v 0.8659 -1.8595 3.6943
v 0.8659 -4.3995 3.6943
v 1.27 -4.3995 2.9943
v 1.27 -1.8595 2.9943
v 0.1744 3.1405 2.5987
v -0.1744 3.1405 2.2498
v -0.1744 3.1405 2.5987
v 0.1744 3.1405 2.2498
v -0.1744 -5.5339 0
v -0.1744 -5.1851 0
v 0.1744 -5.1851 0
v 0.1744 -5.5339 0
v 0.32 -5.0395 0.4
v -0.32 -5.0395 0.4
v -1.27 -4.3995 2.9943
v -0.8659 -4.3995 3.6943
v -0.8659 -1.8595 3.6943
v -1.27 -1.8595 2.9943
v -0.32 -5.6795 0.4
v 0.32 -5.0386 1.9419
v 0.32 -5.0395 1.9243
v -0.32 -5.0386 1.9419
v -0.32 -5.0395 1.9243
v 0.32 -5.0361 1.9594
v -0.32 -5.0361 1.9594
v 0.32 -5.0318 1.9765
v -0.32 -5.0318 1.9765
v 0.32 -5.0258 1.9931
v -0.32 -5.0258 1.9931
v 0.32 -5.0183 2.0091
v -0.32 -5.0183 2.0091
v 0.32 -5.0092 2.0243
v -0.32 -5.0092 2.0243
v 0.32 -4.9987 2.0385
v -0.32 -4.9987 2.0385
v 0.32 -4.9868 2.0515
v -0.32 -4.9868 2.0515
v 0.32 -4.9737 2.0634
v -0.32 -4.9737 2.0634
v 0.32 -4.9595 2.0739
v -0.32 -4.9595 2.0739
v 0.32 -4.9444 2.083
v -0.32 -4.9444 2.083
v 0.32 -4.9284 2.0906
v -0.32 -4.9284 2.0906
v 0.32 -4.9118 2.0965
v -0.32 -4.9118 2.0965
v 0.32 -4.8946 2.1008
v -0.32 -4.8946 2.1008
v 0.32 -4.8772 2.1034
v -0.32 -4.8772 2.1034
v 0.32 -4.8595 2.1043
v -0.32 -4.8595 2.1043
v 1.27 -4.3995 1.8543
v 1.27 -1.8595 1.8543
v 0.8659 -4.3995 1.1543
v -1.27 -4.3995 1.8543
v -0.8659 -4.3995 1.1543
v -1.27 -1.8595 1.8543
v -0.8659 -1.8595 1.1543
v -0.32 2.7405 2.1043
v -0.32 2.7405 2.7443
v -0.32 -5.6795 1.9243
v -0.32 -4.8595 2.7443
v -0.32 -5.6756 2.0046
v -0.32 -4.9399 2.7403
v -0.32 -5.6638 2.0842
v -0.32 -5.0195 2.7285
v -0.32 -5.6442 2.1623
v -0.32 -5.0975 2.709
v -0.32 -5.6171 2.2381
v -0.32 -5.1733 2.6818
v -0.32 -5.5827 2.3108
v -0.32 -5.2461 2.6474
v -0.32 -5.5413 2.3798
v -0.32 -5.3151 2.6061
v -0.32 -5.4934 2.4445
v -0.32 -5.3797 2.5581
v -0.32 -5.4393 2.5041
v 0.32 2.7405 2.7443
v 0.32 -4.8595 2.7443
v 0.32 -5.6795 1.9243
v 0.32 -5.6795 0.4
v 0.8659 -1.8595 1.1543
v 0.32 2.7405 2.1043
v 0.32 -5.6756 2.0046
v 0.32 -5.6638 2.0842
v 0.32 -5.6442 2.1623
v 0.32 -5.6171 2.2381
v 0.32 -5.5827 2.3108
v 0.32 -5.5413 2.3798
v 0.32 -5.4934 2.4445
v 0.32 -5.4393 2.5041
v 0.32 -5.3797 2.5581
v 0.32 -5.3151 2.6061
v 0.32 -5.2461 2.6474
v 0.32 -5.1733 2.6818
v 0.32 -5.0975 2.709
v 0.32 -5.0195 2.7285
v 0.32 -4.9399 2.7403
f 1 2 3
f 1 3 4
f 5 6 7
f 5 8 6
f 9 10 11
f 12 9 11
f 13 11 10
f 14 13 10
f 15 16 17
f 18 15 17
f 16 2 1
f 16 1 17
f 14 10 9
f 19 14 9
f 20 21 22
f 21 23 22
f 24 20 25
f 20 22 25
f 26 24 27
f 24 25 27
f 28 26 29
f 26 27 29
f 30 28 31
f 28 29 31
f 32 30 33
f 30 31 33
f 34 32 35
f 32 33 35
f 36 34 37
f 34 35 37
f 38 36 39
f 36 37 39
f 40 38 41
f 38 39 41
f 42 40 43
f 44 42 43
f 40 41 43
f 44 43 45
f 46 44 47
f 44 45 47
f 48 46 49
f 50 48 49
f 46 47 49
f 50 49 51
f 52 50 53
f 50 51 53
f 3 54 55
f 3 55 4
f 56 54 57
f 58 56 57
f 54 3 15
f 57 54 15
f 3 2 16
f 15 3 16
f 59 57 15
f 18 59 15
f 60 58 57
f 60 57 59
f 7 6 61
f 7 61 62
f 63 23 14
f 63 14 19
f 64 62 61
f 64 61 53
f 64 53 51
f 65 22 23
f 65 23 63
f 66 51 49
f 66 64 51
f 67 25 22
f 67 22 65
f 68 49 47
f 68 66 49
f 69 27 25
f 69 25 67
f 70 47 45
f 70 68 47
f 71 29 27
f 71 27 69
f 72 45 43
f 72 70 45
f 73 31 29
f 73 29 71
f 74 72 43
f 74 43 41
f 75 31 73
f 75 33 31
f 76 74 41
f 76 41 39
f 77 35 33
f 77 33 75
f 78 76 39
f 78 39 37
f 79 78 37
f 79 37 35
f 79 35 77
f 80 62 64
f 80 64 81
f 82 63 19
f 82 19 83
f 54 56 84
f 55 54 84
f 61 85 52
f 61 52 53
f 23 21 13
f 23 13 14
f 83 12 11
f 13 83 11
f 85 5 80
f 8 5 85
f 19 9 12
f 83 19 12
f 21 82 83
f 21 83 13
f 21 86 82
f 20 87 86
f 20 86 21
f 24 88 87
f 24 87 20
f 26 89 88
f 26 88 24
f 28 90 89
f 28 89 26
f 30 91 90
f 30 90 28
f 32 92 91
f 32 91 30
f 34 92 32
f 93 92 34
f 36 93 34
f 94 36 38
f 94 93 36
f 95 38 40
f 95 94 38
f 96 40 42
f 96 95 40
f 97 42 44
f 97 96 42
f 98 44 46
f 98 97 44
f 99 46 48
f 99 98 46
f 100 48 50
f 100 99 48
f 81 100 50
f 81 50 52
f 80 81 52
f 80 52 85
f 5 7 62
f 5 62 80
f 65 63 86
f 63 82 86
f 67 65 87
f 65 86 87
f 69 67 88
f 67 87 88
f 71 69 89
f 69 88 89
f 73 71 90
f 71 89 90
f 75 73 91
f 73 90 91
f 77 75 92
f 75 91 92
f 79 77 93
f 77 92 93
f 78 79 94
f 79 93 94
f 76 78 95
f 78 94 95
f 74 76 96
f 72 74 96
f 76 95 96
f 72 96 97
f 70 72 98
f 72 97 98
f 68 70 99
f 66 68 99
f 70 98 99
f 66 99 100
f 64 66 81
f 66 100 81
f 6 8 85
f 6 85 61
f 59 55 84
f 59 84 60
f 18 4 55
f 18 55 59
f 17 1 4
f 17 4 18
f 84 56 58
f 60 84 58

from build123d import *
from OCP.BRepFilletAPI import BRepFilletAPI_MakeChamfer

# Parameters (mm, degrees)
SKETCH2_W      = 0.64
SKETCH2_H      = 0.64
CHAMFER1_SIZE  = 0.4
CHAMFER1_SIZE2 = 0.145588094
SKETCH6_W      = 2.54
SKETCH6_H      = 2.54
EXTRUDE1_DEPTH = 2.54
CHAMFER2_SIZE  = 0.7
CHAMFER2_SIZE2 = 0.404145188


with BuildPart() as part:
    # Sweep1: sweep along a path in Sketch1
    with BuildLine(Plane(origin=(0, 0, 0), x_dir=(0, 0, -1), z_dir=(1, 0, 0))) as sweep1_path:
        Line((0, -5.359515774), (-1.924260195, -5.359515774))
        ThreePointArc((-1.924260195, -5.359515774), (-2.277813586, -5.213069164), (-2.424260195, -4.859515774))
        Line((-2.424260195, -4.859515774), (-2.424260195, 3.140484226))
    # Sketch2 → Sweep1 (sweep)
    with BuildSketch(Plane.XY):
        with Locations((0, -5.359515774)):
            Rectangle(SKETCH2_W, SKETCH2_H)
    sweep(path=sweep1_path.line)

    # Chamfer1: one chamfer whose edges measure the first distance from different faces: ONE call of the kernel's chamfer builder (chamfer() names one face for all edges)
    chamfer1_edges_1 = [part.edges().sort_by_distance(p)[0] for p in [
        (-0.32, 3.140484226, 2.424260195),
        (-0.32, -5.359515774, 0),
    ]]
    chamfer1_side_1 = [part.faces().sort_by_distance(p)[0] for p in [
        (-0.32, -1.987926827, 2.15141447),
    ]]
    chamfer1_edges_2 = [part.edges().sort_by_distance(p)[0] for p in [
        (0, 3.140484226, 2.104260195),
    ]]
    chamfer1_side_2 = [part.faces().sort_by_distance(p)[0] for p in [
        (0, -0.859515774, 2.104260195),
    ]]
    chamfer1_edges_3 = [part.edges().sort_by_distance(p)[0] for p in [
        (0.32, 3.140484226, 2.424260195),
        (0.32, -5.359515774, 0),
    ]]
    chamfer1_side_3 = [part.faces().sort_by_distance(p)[0] for p in [
        (0.32, -1.987926827, 2.15141447),
    ]]
    chamfer1_edges_4 = [part.edges().sort_by_distance(p)[0] for p in [
        (0, 3.140484226, 2.744260195),
    ]]
    chamfer1_side_4 = [part.faces().sort_by_distance(p)[0] for p in [
        (0, -0.859515774, 2.744260195),
    ]]
    chamfer1_edges_5 = [part.edges().sort_by_distance(p)[0] for p in [
        (0, -5.039515774, 0),
    ]]
    chamfer1_side_5 = [part.faces().sort_by_distance(p)[0] for p in [
        (0, -5.039515774, 0.962130097),
    ]]
    chamfer1_edges_6 = [part.edges().sort_by_distance(p)[0] for p in [
        (0, -5.679515774, 0),
    ]]
    chamfer1_side_6 = [part.faces().sort_by_distance(p)[0] for p in [
        (0, -5.679515774, 0.962130097),
    ]]
    chamfer1 = BRepFilletAPI_MakeChamfer(part.part.solid().wrapped)
    for e in chamfer1_edges_1:
        chamfer1.Add(CHAMFER1_SIZE, CHAMFER1_SIZE2, e.wrapped, chamfer1_side_1[0].wrapped)  # the first distance lies on this face
    for e in chamfer1_edges_2:
        chamfer1.Add(CHAMFER1_SIZE, CHAMFER1_SIZE2, e.wrapped, chamfer1_side_2[0].wrapped)  # the first distance lies on this face
    for e in chamfer1_edges_3:
        chamfer1.Add(CHAMFER1_SIZE, CHAMFER1_SIZE2, e.wrapped, chamfer1_side_3[0].wrapped)  # the first distance lies on this face
    for e in chamfer1_edges_4:
        chamfer1.Add(CHAMFER1_SIZE, CHAMFER1_SIZE2, e.wrapped, chamfer1_side_4[0].wrapped)  # the first distance lies on this face
    for e in chamfer1_edges_5:
        chamfer1.Add(CHAMFER1_SIZE, CHAMFER1_SIZE2, e.wrapped, chamfer1_side_5[0].wrapped)  # the first distance lies on this face
    for e in chamfer1_edges_6:
        chamfer1.Add(CHAMFER1_SIZE, CHAMFER1_SIZE2, e.wrapped, chamfer1_side_6[0].wrapped)  # the first distance lies on this face
    add(Compound.cast(chamfer1.Shape()), mode=Mode.REPLACE)


with BuildPart() as body_2:
    # Sketch6 → Extrude1 (new body)
    with BuildSketch(Plane(origin=(0, -4.399515774, 0), x_dir=(-1, 0, 0), z_dir=(0, 1, 0))):
        with Locations((0, 2.424260195)):
            Rectangle(SKETCH6_W, SKETCH6_H)
    extrude(amount=EXTRUDE1_DEPTH)

    # Chamfer2: one chamfer whose edges measure the first distance from different faces: ONE call of the kernel's chamfer builder (chamfer() names one face for all edges)
    chamfer2_edges_1 = [body_2.edges().sort_by_distance(p)[0] for p in [
        (-1.27, -3.129515774, 1.154260195),
        (-1.27, -3.129515774, 3.694260195),
    ]]
    chamfer2_side_1 = [body_2.faces().sort_by_distance(p)[0] for p in [
        (-1.27, -3.129515774, 2.424260195),
    ]]
    chamfer2_edges_2 = [body_2.edges().sort_by_distance(p)[0] for p in [
        (1.27, -3.129515774, 1.154260195),
        (1.27, -3.129515774, 3.694260195),
    ]]
    chamfer2_side_2 = [body_2.faces().sort_by_distance(p)[0] for p in [
        (1.27, -3.129515774, 2.424260195),
    ]]
    chamfer2 = BRepFilletAPI_MakeChamfer(body_2.part.solid().wrapped)
    for e in chamfer2_edges_1:
        chamfer2.Add(CHAMFER2_SIZE, CHAMFER2_SIZE2, e.wrapped, chamfer2_side_1[0].wrapped)  # the first distance lies on this face
    for e in chamfer2_edges_2:
        chamfer2.Add(CHAMFER2_SIZE, CHAMFER2_SIZE2, e.wrapped, chamfer2_side_2[0].wrapped)  # the first distance lies on this face
    add(Compound.cast(chamfer2.Shape()), mode=Mode.REPLACE)


solid = Compound([part.part, body_2.part])
